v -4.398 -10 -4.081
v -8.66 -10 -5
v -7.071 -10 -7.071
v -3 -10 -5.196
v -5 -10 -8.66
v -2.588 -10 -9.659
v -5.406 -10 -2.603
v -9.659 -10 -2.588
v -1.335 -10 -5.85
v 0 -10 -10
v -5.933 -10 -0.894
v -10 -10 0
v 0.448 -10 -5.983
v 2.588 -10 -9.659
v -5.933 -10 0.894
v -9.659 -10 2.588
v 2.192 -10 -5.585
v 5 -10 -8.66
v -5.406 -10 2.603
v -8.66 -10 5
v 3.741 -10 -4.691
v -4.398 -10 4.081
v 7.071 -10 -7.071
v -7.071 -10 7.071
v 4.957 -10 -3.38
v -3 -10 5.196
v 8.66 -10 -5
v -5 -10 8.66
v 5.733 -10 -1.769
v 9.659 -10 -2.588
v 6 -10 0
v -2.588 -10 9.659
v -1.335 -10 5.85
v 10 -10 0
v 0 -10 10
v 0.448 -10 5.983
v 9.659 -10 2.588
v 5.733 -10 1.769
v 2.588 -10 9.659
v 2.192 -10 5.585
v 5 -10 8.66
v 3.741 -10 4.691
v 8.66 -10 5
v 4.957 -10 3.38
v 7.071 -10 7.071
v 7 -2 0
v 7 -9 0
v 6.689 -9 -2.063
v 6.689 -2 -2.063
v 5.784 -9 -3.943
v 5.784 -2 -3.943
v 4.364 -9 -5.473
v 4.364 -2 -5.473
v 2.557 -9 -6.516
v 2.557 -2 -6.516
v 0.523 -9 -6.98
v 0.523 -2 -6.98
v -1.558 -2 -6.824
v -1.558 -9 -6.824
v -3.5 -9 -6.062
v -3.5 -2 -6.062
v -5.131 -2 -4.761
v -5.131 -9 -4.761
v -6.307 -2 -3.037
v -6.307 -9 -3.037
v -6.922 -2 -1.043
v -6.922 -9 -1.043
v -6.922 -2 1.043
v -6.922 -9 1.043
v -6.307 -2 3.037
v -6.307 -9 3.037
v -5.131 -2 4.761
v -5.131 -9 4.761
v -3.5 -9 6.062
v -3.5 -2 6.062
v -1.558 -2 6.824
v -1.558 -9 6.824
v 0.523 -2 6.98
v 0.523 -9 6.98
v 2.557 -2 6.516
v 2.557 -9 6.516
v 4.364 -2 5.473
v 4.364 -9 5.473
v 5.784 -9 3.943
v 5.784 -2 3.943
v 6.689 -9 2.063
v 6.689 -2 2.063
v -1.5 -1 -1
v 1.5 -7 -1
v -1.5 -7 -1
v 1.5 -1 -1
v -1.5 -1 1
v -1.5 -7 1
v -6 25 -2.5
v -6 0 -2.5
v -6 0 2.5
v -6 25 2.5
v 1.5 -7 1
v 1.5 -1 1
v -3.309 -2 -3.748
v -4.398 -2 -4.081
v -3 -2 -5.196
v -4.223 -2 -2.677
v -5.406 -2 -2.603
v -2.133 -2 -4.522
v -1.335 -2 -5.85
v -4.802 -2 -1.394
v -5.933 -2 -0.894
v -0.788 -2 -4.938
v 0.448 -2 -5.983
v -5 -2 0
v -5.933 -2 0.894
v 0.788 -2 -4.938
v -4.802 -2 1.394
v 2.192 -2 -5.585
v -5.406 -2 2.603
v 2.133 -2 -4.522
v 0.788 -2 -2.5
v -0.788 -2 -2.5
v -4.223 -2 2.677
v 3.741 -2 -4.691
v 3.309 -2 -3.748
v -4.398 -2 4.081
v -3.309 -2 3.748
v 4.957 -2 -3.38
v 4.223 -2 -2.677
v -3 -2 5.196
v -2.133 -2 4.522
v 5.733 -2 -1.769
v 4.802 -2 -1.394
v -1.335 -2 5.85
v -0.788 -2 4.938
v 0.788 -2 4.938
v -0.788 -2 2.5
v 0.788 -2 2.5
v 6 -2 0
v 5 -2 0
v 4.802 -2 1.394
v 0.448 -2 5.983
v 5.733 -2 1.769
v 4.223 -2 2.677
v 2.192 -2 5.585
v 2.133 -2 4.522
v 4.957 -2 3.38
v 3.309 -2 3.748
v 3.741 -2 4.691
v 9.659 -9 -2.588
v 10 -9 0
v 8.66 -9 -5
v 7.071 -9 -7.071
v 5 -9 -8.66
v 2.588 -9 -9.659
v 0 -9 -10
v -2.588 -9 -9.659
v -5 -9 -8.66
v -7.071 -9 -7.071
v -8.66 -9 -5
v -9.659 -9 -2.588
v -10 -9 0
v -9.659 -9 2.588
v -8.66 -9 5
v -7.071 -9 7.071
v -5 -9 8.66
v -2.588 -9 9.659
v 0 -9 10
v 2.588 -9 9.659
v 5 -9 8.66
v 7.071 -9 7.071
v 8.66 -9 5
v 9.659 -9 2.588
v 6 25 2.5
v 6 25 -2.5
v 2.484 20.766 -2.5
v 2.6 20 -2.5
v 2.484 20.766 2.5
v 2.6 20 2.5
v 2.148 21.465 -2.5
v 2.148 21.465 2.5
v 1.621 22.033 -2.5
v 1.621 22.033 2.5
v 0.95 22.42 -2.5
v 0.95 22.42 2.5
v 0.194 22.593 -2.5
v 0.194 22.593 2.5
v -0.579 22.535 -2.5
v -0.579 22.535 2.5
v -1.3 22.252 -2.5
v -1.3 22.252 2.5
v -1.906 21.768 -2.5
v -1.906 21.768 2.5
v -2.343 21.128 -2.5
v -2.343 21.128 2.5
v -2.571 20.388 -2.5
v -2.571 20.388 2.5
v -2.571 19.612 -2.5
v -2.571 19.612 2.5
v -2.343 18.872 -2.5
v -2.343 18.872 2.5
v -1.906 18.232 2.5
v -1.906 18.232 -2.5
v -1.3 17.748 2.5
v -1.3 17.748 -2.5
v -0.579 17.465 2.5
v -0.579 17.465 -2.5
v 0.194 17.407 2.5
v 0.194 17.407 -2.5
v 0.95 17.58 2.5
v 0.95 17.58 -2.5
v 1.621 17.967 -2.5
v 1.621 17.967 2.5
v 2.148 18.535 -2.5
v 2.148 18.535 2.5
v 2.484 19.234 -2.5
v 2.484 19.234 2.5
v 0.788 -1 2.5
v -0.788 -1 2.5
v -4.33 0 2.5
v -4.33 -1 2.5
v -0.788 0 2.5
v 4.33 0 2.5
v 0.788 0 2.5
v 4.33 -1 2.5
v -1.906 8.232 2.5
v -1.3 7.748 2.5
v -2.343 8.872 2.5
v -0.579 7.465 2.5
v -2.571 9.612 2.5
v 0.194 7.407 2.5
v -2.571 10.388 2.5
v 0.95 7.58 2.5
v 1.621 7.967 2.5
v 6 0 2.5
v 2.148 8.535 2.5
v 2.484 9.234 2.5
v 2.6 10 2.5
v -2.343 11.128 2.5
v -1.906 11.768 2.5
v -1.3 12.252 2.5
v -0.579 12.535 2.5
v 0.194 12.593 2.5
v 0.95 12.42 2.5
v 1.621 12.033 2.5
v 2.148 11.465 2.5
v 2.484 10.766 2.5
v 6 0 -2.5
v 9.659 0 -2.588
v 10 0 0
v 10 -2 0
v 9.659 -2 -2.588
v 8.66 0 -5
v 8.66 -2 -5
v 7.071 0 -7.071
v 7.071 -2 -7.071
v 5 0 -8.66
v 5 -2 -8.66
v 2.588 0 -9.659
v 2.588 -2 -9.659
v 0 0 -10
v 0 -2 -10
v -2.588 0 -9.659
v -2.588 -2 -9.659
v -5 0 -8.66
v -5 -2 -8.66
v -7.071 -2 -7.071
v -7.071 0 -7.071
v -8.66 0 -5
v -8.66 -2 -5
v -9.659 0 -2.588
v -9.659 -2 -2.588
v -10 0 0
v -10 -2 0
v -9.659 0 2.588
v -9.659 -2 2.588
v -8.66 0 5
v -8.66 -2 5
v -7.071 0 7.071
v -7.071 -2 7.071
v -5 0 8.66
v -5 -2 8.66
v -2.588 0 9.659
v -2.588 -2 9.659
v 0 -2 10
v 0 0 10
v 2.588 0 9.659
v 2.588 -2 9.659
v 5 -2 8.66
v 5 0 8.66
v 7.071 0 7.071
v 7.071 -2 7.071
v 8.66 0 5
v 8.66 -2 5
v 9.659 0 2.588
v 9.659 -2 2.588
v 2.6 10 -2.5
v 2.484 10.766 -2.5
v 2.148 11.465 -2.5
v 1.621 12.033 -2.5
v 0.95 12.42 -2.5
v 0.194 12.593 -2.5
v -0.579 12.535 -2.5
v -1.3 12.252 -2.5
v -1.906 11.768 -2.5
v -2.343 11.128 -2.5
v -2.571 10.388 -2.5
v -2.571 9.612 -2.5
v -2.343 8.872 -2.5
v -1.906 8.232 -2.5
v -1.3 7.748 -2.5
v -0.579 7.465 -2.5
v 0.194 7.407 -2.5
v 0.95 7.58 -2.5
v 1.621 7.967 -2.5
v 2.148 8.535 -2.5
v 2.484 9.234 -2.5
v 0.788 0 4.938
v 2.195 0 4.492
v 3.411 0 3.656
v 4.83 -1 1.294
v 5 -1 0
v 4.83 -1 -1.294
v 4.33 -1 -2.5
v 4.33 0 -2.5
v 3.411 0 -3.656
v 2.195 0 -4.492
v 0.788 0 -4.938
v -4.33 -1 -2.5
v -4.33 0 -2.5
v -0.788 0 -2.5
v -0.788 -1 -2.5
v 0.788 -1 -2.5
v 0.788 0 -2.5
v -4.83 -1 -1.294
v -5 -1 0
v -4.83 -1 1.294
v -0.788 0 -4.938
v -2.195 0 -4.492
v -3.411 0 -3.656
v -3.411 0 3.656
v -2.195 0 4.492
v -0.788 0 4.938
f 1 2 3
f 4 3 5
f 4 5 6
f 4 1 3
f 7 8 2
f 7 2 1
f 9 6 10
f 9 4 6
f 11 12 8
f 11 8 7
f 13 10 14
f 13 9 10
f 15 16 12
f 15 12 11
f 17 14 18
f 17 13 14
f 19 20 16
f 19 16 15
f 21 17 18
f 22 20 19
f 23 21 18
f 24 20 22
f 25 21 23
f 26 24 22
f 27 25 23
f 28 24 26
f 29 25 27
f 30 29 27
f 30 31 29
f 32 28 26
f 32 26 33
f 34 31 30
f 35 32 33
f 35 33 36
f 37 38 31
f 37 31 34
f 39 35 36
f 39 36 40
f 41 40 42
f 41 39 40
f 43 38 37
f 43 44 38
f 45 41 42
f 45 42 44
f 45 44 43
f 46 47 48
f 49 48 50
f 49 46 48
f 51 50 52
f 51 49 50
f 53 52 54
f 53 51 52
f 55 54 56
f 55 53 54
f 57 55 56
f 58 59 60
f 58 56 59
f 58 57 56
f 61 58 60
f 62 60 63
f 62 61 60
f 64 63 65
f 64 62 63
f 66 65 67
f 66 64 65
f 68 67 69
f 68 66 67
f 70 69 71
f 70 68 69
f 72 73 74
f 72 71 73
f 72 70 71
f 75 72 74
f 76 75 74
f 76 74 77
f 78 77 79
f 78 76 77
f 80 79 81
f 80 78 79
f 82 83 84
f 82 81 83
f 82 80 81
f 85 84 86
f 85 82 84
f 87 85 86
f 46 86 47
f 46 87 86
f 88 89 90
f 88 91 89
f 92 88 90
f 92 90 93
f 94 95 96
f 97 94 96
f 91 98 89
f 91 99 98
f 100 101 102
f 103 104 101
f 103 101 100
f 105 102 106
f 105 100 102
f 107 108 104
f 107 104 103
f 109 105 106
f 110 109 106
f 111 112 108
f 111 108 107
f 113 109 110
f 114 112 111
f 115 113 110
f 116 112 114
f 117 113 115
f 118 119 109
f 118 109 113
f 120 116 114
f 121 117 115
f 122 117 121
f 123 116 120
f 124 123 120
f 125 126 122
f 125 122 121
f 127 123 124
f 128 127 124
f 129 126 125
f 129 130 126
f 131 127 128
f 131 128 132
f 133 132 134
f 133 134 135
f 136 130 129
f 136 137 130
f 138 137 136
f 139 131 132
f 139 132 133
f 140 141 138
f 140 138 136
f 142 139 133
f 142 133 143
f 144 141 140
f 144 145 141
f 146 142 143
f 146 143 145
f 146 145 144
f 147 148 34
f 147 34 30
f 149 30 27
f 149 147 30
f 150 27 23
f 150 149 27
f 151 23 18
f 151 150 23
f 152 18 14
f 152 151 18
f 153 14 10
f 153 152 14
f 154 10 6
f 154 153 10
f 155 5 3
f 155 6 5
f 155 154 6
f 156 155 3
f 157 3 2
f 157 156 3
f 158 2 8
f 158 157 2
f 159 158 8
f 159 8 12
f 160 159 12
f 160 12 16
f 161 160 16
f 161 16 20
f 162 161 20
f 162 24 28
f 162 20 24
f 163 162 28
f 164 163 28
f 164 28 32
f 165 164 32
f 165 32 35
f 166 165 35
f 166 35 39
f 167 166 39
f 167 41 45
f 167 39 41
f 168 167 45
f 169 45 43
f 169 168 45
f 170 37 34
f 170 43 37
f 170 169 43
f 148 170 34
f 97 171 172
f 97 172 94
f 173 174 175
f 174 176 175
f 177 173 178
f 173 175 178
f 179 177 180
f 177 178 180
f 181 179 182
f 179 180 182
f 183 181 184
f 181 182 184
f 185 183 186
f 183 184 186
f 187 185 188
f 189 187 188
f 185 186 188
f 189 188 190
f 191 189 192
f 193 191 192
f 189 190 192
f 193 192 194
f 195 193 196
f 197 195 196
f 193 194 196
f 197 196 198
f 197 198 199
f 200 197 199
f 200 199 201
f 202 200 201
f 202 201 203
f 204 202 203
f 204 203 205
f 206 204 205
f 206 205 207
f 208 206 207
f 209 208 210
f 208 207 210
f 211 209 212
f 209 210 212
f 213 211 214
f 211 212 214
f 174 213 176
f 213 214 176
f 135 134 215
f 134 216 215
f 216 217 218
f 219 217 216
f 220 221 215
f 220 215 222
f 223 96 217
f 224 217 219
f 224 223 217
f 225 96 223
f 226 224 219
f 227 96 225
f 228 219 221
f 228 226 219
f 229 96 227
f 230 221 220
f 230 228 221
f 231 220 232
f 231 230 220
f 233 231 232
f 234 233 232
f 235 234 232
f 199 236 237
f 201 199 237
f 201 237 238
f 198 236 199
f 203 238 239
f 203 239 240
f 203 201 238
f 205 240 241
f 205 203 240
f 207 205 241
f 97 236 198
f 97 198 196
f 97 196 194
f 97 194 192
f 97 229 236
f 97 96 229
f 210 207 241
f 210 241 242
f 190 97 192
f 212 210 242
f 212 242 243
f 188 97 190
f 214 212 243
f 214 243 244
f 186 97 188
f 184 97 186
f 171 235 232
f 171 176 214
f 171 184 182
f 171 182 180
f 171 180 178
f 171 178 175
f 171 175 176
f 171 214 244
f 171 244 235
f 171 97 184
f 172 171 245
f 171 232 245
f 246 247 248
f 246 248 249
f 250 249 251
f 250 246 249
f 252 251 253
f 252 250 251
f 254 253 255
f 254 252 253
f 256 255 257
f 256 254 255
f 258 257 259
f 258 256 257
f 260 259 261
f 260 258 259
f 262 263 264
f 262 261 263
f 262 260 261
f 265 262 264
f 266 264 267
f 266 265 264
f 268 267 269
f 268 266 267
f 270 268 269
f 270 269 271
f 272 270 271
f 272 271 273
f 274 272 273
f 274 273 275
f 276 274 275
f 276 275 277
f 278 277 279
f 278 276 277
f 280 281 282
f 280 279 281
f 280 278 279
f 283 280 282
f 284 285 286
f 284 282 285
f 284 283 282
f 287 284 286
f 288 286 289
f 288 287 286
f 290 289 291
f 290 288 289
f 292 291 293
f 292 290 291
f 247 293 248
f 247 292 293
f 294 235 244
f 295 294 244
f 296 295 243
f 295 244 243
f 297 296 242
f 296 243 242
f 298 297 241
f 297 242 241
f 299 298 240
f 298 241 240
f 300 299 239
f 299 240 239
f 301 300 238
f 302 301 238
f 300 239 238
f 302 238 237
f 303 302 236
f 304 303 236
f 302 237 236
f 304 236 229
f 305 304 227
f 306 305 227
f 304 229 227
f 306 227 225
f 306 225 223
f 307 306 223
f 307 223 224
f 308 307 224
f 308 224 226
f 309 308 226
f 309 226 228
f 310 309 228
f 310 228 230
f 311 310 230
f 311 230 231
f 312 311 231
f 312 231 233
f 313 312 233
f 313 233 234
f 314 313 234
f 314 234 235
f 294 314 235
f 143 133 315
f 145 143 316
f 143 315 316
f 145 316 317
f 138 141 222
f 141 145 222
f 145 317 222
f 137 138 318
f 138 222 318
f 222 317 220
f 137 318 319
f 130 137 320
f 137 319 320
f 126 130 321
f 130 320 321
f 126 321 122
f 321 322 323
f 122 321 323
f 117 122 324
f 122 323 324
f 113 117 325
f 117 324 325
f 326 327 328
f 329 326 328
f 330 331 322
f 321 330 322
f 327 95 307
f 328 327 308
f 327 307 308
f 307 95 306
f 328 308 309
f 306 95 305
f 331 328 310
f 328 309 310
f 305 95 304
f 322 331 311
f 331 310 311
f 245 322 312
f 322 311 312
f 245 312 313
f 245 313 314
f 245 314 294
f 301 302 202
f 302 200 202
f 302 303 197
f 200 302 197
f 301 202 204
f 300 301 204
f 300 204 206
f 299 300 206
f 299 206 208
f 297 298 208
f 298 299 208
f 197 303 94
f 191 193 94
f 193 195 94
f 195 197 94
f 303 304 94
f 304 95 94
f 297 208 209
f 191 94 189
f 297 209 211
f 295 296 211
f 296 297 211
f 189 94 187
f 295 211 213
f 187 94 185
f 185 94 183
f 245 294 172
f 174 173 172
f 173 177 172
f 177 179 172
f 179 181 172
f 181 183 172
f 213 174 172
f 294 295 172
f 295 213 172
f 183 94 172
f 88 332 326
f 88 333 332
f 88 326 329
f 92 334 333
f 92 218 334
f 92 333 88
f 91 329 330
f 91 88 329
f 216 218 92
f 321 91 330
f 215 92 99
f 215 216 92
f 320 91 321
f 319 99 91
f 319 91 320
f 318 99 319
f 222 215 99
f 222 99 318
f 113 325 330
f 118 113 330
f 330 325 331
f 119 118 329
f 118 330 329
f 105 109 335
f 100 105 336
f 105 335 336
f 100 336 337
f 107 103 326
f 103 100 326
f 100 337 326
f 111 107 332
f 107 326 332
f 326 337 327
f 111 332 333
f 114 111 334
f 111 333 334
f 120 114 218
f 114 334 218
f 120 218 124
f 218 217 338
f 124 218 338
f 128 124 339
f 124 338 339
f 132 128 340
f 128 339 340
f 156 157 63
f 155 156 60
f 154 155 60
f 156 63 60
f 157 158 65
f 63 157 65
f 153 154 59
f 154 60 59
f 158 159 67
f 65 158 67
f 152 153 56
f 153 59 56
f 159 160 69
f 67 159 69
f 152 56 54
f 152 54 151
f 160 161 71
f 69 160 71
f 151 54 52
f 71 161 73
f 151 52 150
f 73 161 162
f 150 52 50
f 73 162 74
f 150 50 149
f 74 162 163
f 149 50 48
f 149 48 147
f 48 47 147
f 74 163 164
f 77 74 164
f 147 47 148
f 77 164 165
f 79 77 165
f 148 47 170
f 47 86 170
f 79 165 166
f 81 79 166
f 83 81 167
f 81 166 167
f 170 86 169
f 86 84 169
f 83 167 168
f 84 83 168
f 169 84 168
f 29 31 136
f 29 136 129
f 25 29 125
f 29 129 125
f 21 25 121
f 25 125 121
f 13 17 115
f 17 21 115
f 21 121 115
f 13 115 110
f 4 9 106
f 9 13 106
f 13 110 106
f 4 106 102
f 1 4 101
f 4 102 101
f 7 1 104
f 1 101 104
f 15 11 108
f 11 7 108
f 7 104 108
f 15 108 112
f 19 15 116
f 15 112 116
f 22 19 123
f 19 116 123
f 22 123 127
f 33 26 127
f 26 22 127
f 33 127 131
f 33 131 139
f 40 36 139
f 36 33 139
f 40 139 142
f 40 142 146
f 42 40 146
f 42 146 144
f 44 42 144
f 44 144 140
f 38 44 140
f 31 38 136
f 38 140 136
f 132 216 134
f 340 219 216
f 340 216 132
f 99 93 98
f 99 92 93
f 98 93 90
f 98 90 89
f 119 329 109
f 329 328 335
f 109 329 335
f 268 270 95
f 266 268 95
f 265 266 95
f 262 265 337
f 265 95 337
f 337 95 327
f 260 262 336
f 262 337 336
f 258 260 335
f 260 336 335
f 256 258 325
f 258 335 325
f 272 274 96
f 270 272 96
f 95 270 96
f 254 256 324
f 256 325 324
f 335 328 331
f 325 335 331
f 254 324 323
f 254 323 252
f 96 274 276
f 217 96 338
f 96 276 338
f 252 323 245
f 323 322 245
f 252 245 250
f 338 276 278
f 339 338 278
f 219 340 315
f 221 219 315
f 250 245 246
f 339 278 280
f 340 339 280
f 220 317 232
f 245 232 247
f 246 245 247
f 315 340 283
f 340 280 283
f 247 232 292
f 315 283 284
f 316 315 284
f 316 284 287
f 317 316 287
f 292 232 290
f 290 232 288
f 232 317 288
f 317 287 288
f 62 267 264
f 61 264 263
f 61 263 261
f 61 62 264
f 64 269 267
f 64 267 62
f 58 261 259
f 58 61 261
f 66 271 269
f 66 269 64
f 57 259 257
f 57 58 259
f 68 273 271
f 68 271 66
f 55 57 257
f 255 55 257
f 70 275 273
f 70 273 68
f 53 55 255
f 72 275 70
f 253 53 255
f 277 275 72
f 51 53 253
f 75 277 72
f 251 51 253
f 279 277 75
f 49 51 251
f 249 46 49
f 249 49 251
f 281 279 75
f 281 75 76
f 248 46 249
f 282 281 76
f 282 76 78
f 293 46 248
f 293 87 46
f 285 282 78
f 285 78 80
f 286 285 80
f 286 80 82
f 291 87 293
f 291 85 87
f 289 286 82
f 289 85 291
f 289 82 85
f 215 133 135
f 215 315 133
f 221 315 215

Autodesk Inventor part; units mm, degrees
ref_plane "YZ Plane" through (0, 0, 0) normal (1, 0, 0) x (0, 1, 0)
ref_plane "XZ Plane" through (0, 0, 0) normal (0, 1, 0) x (-1, 0, 0)
ref_plane "XY Plane" through (0, 0, 0) normal (0, 0, 1) x (1, 0, 0)
sketch "草圖1" plane through (0, 0, 0) normal (0, 1, 0) x (-1, 0, 0)
  line L0 (6, 2.5) -> (-6, 2.5)
  line L1 (-6, 2.5) -> (-6, -2.5)
  line L2 (-6, -2.5) -> (6, -2.5)
  line L3 (6, -2.5) -> (6, 2.5)
  line L4 (6, 2.5) -> (-6, -2.5) construction
  line L5 (-6, 2.5) -> (6, -2.5) construction
  point P0 (0, 0)
  dimension "d0" = 5
  dimension "d1" = 12
extrude "擠出1" add sketch "草圖1" along normal blind 25
sketch "草圖2" plane through (-6, 0, 2.5) normal (0, 0, 1) x (1, 0, 0)
  circle A0 centre (6, 20) radius 2.6
  circle A1 centre (6, 10) radius 2.6
  line L0 (0, 0) -> (12, 0) projected
  line L1 (0, 25) -> (12, 25) projected
  line L2 (6, 25) -> (6, 0)
  line L3 (12, 0) -> (0, 0) projected
  point P0 (6, 0)
  dimension "d4" = 5.2
  dimension "d5" = 5.2
  dimension "d6" = 10
  dimension "d7" = 10
  dimension "d8" = 5
extrude "擠出2" cut sketch "草圖2" against normal blind 10
sketch "草圖3" plane through (0, 0, 0) normal (0, -1, 0) x (1, 0, 0)
  circle A0 centre (0, 0) radius 5
  circle A1 centre (0, 0) radius 10
  dimension "d11" = 10
  dimension "d12" = 20
extrude "擠出3" add sketch "草圖3" along normal blind 2
sketch "草圖4" plane through (0, -2, 0) normal (0, -1, 0) x (1, 0, 0)
  circle A0 centre (0, 0) radius 6
  circle A1 centre (0, 0) radius 7
  dimension "d15" = 12
  dimension "d16" = 14
extrude "擠出4" add sketch "草圖4" along normal blind 7
sketch "草圖5" plane through (0, 0, 0) normal (0, -1, 0) x (1, 0, 0)
  line L0 (-1.5, 1) -> (1.5, 1)
  line L1 (1.5, 1) -> (1.5, -1)
  line L2 (1.5, -1) -> (-1.5, -1)
  line L3 (-1.5, -1) -> (-1.5, 1)
  line L4 (-1.5, 1) -> (1.5, -1) construction
  line L5 (1.5, 1) -> (-1.5, -1) construction
  point P0 (0, 0)
  dimension "d19" = 3
  dimension "d20" = 2
extrude "擠出5" add sketch "草圖5" along normal blind 7
sketch "草圖6" plane through (0, 0, 0) normal (0, 1, 0) x (1, 0, 0)
  line L0 (-4.3301, -2.5) -> (4.3301, -2.5) projected
  line L1 (-0.7875, -7.5) -> (0.7875, -7.5)
  line L2 (0.7875, -7.5) -> (0.7875, -2.5)
  line L3 (0.7875, -2.5) -> (-0.7875, -2.5)
  line L4 (-0.7875, -2.5) -> (-0.7875, -7.5)
  arc A0 (-4.3301, -2.5) -> (4.3301, -2.5) centre (0, 0) ccw projected
  line L5 (-0.7875, -7.5) -> (0.7875, -2.5) construction
  line L6 (0.7875, -7.5) -> (-0.7875, -2.5) construction
  line L7 (-0.7875, 7.5) -> (0.7875, 7.5)
  line L8 (0.7875, 7.5) -> (0.7875, 2.5)
  line L9 (0.7875, 2.5) -> (-0.7875, 2.5)
  line L10 (-0.7875, 2.5) -> (-0.7875, 7.5)
  arc A1 (4.3301, 2.5) -> (-4.3301, 2.5) centre (0, 0) ccw projected
  line L11 (-0.7875, 7.5) -> (0.7875, 2.5) construction
  line L12 (0.7875, 7.5) -> (-0.7875, 2.5) construction
  point P0 (0, -5)
  point P1 (0, 5)
extrude "擠出6" add sketch "草圖6" against normal blind 2 contours L0 L2 A0 L4 | A0 L2 L1 L4 | L7 L8 A1 L10 | A1 L8 L9 L10
sketch "草圖7" plane through (0, -9, 0) normal (0, -1, 0) x (1, 0, 0)
  circle A0 centre (0, 0) radius 6
  circle A1 centre (0, 0) radius 10
extrude "擠出7" add sketch "草圖7" along normal blind 1
sketch "草圖8" plane through (0, 0, 0) normal (0, -1, 0) x (1, 0, 0)
  line L0 (4.3301, 2.5) -> (6, 2.5) projected
  line L1 (-6, -2.5) -> (6, -2.5)
  line L2 (6, -2.5) -> (6, 2.5)
  line L3 (6, 2.5) -> (-6, 2.5)
  line L4 (-6, 2.5) -> (-6, -2.5)
  line L5 (-6, -2.5) -> (6, 2.5) construction
  line L6 (6, -2.5) -> (-6, 2.5) construction
  point P0 (0, 0)
extrude "擠出8" add sketch "草圖8" along normal blind 1
equation "\"d9\" = d7"
properties part number "圓形同心線圈外"
